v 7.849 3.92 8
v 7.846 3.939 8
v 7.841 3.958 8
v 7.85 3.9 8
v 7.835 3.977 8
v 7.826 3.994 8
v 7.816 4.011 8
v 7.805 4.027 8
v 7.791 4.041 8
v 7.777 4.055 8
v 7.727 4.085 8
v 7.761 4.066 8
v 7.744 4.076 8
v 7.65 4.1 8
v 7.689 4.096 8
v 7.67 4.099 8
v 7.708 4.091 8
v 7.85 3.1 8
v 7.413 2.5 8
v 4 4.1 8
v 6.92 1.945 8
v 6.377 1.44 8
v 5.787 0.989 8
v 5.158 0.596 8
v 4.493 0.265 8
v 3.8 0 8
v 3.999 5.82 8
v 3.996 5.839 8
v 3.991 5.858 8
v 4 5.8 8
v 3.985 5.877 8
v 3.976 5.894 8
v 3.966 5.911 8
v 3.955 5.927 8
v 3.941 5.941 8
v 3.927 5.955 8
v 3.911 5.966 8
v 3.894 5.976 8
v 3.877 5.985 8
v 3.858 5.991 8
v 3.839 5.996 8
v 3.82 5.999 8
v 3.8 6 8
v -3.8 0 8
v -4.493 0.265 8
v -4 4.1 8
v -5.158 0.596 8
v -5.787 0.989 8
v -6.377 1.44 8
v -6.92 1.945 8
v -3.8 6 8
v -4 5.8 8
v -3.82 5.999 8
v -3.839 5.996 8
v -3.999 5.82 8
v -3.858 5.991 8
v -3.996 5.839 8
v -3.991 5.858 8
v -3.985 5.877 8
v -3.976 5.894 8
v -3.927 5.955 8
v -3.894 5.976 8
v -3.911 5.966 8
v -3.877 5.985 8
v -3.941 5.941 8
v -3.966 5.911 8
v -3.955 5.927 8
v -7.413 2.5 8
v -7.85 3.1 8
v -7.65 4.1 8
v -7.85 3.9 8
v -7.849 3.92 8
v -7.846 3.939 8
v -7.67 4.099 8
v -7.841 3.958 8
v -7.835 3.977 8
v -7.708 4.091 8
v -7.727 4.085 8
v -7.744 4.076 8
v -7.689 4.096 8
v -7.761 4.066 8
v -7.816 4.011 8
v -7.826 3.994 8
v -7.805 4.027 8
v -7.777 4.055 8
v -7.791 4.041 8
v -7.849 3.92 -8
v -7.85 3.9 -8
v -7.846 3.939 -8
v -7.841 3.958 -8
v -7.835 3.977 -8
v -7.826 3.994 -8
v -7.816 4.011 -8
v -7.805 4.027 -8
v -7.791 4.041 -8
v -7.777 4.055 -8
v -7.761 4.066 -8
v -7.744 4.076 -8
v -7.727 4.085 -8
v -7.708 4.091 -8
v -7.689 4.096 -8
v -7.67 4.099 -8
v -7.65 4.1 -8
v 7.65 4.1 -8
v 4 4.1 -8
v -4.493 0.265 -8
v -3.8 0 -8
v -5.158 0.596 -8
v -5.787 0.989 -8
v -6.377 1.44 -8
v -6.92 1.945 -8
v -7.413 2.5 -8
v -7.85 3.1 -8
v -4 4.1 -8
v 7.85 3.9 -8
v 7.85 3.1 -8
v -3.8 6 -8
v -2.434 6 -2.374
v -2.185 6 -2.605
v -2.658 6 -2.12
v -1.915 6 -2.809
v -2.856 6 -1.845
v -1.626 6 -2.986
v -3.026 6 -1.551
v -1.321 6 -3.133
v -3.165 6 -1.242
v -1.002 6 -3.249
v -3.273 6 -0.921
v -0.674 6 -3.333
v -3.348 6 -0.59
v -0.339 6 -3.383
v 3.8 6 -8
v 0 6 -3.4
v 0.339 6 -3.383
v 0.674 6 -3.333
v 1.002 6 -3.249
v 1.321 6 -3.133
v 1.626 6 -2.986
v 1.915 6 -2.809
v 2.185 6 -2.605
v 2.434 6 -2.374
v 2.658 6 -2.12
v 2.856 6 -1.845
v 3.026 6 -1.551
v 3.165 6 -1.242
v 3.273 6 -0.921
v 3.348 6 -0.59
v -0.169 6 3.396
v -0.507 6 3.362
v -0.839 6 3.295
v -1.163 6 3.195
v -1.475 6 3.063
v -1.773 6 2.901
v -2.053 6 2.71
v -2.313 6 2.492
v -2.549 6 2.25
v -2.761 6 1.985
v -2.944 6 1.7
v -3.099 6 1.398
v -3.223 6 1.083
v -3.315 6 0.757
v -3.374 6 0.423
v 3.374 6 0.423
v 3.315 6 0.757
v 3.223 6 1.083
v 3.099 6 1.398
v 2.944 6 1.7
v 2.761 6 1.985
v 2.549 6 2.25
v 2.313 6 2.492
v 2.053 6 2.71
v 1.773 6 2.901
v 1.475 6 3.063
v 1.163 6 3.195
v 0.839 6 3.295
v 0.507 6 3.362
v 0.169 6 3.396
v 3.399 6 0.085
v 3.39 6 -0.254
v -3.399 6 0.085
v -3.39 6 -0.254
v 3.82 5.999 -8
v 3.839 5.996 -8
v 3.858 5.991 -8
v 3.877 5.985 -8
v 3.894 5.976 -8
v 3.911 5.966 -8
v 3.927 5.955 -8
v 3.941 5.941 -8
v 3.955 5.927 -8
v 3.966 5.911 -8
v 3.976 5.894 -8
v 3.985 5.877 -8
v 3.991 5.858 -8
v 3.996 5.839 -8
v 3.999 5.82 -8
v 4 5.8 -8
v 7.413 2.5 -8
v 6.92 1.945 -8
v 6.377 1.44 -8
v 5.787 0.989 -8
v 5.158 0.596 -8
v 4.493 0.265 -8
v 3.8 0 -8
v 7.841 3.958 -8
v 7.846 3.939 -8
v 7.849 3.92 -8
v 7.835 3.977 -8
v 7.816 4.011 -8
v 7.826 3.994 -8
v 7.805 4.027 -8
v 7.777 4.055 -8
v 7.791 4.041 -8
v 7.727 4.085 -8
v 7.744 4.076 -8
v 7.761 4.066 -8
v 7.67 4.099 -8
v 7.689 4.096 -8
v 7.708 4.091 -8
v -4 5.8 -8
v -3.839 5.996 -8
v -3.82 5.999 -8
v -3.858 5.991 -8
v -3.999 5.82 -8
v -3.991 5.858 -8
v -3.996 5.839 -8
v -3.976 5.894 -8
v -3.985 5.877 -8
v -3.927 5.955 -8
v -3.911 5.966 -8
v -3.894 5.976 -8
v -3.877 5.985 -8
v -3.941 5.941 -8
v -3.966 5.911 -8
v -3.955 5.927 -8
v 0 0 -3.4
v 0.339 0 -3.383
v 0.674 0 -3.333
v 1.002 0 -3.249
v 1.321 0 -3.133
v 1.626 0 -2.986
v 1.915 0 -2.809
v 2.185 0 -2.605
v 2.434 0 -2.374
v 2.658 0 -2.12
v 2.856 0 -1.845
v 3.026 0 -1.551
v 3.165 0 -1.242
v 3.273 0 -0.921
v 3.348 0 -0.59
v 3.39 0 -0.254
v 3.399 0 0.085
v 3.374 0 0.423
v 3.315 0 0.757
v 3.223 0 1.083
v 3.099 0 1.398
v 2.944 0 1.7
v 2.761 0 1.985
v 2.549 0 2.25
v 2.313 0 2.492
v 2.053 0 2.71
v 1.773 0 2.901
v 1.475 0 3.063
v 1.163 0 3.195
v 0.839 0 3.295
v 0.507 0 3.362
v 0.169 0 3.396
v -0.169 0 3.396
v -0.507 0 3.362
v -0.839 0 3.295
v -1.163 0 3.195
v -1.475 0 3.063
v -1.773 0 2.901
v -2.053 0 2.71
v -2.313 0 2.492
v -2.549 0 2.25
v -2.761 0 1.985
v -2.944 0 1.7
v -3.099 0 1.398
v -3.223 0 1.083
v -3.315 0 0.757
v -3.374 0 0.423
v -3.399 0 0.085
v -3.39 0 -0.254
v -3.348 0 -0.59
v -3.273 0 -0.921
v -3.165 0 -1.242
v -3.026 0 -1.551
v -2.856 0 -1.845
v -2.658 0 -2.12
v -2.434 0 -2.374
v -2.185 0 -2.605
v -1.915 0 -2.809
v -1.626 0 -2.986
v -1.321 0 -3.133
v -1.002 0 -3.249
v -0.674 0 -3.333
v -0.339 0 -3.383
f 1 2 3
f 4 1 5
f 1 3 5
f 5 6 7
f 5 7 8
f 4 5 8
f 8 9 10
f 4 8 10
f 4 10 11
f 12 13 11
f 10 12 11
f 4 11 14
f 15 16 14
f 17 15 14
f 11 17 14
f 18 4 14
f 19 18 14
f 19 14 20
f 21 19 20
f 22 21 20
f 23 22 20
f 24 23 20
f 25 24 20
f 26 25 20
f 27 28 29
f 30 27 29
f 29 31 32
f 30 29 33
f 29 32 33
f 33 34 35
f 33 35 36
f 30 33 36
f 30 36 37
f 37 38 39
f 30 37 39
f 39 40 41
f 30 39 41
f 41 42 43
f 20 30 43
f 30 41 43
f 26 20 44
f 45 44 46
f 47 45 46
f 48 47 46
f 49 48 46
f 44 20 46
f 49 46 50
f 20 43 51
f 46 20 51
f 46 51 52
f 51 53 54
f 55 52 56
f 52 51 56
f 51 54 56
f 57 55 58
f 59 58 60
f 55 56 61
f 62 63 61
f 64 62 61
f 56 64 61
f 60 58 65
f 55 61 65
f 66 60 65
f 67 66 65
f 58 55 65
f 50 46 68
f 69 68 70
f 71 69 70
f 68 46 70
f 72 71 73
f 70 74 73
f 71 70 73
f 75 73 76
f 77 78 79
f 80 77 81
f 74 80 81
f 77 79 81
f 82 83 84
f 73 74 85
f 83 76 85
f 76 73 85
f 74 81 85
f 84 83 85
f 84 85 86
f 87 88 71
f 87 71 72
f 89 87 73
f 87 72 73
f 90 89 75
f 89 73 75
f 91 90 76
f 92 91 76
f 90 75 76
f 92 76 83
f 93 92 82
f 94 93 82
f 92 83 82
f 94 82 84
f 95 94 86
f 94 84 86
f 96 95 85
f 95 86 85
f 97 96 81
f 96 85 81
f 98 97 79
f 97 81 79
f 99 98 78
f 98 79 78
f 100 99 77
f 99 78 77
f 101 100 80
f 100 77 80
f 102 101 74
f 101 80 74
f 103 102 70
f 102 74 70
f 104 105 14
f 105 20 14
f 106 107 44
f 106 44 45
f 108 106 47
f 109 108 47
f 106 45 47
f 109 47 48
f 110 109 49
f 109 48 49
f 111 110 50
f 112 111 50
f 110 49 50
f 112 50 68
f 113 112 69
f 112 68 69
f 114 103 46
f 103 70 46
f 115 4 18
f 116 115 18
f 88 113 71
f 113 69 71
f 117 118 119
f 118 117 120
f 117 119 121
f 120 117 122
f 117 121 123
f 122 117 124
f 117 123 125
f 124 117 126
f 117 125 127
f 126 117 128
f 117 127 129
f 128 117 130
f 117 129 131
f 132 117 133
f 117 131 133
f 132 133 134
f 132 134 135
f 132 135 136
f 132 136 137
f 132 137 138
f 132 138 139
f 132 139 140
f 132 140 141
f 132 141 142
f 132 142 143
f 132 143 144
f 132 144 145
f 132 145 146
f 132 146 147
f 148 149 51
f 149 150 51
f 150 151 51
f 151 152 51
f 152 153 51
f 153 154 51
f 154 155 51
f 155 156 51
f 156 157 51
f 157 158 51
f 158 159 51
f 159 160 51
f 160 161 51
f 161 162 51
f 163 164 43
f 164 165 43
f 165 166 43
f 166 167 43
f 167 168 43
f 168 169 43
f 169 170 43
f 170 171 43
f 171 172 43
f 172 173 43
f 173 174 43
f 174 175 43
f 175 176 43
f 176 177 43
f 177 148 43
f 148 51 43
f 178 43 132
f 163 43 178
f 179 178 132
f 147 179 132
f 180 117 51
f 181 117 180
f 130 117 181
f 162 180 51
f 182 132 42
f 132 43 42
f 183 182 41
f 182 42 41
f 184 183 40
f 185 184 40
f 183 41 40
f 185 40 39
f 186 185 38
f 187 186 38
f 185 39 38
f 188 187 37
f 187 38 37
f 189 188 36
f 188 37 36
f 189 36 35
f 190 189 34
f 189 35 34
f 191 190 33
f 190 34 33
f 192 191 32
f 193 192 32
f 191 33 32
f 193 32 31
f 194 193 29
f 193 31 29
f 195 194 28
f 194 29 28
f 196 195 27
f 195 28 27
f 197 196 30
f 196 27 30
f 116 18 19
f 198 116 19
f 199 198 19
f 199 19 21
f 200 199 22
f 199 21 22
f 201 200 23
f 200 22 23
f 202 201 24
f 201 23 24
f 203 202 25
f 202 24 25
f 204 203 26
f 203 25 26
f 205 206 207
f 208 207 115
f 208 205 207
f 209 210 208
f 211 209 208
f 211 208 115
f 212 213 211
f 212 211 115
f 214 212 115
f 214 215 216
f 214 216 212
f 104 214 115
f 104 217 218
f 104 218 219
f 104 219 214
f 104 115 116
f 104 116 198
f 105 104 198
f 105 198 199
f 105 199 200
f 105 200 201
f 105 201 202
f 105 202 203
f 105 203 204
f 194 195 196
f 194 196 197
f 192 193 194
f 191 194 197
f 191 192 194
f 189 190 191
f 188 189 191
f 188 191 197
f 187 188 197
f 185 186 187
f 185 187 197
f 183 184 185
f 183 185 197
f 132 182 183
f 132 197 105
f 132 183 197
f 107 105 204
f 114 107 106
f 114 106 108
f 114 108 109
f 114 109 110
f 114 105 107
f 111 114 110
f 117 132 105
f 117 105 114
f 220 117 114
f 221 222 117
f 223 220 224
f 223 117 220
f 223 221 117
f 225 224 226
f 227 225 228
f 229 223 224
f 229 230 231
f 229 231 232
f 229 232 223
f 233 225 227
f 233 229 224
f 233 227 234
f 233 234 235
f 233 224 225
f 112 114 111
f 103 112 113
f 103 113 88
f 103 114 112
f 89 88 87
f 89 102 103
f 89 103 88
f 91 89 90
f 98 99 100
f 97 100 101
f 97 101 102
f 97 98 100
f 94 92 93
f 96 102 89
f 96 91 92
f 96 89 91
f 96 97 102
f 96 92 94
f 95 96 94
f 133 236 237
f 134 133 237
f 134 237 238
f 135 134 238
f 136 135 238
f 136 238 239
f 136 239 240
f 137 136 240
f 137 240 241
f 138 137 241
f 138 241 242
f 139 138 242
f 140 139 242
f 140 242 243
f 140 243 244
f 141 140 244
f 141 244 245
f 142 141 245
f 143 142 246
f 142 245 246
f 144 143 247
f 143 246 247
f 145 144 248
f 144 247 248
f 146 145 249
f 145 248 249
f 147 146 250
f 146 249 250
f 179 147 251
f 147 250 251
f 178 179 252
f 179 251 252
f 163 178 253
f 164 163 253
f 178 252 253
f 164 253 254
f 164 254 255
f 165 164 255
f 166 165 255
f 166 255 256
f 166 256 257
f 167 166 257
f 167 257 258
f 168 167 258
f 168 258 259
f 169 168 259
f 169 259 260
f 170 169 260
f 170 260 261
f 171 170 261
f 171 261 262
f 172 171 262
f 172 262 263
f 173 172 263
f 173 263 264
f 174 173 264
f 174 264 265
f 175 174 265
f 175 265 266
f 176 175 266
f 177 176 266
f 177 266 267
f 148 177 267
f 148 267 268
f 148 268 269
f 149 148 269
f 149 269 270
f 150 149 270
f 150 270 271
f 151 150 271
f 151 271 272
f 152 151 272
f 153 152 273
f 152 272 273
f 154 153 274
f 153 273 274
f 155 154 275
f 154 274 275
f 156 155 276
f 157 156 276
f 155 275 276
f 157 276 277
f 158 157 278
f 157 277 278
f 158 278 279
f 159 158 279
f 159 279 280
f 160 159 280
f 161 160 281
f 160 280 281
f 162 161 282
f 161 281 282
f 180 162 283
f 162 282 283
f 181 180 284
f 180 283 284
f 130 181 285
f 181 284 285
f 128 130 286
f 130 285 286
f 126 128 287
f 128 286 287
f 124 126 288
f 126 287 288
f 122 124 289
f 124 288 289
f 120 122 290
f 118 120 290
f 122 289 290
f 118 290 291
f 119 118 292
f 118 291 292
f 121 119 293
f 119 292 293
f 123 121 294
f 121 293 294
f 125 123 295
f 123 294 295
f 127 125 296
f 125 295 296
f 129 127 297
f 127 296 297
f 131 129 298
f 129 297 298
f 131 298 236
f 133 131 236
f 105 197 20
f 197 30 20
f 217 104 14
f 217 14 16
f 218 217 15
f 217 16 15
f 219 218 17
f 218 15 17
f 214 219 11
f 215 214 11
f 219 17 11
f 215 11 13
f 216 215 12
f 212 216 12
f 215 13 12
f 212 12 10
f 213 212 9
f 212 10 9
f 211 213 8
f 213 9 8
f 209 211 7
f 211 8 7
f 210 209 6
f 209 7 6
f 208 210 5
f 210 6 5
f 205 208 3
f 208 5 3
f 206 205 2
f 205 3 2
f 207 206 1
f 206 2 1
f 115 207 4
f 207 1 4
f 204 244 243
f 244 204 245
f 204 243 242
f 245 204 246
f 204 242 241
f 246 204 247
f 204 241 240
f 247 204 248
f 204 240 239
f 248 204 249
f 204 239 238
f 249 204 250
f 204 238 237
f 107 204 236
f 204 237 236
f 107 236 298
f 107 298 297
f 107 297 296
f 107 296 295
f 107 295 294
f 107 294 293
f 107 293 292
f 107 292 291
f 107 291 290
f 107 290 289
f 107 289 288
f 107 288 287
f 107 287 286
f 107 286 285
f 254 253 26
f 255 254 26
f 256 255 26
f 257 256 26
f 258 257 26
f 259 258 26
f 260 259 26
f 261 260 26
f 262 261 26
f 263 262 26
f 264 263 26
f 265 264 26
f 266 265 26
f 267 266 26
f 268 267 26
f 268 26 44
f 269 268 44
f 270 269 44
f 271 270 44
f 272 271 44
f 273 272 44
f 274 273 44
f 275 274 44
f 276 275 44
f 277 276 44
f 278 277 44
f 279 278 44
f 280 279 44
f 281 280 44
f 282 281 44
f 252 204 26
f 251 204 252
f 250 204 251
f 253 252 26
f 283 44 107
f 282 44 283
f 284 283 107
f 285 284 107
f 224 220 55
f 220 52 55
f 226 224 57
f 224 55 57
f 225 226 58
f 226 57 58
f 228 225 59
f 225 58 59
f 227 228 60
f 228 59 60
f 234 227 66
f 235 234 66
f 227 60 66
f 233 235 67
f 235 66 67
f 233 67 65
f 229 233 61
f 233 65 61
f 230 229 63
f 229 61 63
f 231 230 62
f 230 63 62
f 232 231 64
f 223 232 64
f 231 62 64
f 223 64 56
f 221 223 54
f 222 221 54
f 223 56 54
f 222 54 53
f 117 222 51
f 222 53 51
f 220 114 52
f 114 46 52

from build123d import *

# Parameters (mm, degrees)
EXTRUDE_1_DEPTH        = 8
HOLE_WIZARD_M8_1_D     = 6.8
HOLE_WIZARD_M8_1_DEPTH = 19.75
HOLE_WIZARD_M8_1_TIP   = 2.042926105


with BuildPart() as part:
    # 草图1 → 凸台-拉伸1 (new, symmetric)
    with BuildSketch(Plane.XY):
        with BuildLine():
            Line((3.8, 0), (-3.8, 0))
            ThreePointArc((-3.8, 0), (-6.087496121, 1.207061519), (-7.85, 3.1))
            Line((-7.85, 3.1), (-7.85, 3.9))
            ThreePointArc((-7.85, 3.9), (-7.791421356, 4.041421356), (-7.65, 4.1))
            Line((-7.65, 4.1), (-4, 4.1))
            Line((-4, 4.1), (-4, 5.8))
            ThreePointArc((-4, 5.8), (-3.941421356, 5.941421356), (-3.8, 6))
            Line((-3.8, 6), (3.8, 6))
            ThreePointArc((3.8, 6), (3.941421356, 5.941421356), (4, 5.8))
            Line((4, 5.8), (4, 4.1))
            Line((4, 4.1), (7.65, 4.1))
            ThreePointArc((7.65, 4.1), (7.791421356, 4.041421356), (7.85, 3.9))
            Line((7.85, 3.9), (7.85, 3.1))
            ThreePointArc((7.85, 3.1), (6.087496121, 1.207061519), (3.8, 0))
        make_face()
    extrude(amount=EXTRUDE_1_DEPTH, both=True)

    # M8 螺纹孔1
    with Locations(Plane.ZX.offset(6)):
        with Locations((0, 0)):
            Hole(HOLE_WIZARD_M8_1_D / 2, depth=HOLE_WIZARD_M8_1_DEPTH)
            with Locations((0, 0, -(HOLE_WIZARD_M8_1_DEPTH + HOLE_WIZARD_M8_1_TIP / 2))):  # 118° drill point
                Cone(0, HOLE_WIZARD_M8_1_D / 2, HOLE_WIZARD_M8_1_TIP, mode=Mode.SUBTRACT)


solid = part.part
